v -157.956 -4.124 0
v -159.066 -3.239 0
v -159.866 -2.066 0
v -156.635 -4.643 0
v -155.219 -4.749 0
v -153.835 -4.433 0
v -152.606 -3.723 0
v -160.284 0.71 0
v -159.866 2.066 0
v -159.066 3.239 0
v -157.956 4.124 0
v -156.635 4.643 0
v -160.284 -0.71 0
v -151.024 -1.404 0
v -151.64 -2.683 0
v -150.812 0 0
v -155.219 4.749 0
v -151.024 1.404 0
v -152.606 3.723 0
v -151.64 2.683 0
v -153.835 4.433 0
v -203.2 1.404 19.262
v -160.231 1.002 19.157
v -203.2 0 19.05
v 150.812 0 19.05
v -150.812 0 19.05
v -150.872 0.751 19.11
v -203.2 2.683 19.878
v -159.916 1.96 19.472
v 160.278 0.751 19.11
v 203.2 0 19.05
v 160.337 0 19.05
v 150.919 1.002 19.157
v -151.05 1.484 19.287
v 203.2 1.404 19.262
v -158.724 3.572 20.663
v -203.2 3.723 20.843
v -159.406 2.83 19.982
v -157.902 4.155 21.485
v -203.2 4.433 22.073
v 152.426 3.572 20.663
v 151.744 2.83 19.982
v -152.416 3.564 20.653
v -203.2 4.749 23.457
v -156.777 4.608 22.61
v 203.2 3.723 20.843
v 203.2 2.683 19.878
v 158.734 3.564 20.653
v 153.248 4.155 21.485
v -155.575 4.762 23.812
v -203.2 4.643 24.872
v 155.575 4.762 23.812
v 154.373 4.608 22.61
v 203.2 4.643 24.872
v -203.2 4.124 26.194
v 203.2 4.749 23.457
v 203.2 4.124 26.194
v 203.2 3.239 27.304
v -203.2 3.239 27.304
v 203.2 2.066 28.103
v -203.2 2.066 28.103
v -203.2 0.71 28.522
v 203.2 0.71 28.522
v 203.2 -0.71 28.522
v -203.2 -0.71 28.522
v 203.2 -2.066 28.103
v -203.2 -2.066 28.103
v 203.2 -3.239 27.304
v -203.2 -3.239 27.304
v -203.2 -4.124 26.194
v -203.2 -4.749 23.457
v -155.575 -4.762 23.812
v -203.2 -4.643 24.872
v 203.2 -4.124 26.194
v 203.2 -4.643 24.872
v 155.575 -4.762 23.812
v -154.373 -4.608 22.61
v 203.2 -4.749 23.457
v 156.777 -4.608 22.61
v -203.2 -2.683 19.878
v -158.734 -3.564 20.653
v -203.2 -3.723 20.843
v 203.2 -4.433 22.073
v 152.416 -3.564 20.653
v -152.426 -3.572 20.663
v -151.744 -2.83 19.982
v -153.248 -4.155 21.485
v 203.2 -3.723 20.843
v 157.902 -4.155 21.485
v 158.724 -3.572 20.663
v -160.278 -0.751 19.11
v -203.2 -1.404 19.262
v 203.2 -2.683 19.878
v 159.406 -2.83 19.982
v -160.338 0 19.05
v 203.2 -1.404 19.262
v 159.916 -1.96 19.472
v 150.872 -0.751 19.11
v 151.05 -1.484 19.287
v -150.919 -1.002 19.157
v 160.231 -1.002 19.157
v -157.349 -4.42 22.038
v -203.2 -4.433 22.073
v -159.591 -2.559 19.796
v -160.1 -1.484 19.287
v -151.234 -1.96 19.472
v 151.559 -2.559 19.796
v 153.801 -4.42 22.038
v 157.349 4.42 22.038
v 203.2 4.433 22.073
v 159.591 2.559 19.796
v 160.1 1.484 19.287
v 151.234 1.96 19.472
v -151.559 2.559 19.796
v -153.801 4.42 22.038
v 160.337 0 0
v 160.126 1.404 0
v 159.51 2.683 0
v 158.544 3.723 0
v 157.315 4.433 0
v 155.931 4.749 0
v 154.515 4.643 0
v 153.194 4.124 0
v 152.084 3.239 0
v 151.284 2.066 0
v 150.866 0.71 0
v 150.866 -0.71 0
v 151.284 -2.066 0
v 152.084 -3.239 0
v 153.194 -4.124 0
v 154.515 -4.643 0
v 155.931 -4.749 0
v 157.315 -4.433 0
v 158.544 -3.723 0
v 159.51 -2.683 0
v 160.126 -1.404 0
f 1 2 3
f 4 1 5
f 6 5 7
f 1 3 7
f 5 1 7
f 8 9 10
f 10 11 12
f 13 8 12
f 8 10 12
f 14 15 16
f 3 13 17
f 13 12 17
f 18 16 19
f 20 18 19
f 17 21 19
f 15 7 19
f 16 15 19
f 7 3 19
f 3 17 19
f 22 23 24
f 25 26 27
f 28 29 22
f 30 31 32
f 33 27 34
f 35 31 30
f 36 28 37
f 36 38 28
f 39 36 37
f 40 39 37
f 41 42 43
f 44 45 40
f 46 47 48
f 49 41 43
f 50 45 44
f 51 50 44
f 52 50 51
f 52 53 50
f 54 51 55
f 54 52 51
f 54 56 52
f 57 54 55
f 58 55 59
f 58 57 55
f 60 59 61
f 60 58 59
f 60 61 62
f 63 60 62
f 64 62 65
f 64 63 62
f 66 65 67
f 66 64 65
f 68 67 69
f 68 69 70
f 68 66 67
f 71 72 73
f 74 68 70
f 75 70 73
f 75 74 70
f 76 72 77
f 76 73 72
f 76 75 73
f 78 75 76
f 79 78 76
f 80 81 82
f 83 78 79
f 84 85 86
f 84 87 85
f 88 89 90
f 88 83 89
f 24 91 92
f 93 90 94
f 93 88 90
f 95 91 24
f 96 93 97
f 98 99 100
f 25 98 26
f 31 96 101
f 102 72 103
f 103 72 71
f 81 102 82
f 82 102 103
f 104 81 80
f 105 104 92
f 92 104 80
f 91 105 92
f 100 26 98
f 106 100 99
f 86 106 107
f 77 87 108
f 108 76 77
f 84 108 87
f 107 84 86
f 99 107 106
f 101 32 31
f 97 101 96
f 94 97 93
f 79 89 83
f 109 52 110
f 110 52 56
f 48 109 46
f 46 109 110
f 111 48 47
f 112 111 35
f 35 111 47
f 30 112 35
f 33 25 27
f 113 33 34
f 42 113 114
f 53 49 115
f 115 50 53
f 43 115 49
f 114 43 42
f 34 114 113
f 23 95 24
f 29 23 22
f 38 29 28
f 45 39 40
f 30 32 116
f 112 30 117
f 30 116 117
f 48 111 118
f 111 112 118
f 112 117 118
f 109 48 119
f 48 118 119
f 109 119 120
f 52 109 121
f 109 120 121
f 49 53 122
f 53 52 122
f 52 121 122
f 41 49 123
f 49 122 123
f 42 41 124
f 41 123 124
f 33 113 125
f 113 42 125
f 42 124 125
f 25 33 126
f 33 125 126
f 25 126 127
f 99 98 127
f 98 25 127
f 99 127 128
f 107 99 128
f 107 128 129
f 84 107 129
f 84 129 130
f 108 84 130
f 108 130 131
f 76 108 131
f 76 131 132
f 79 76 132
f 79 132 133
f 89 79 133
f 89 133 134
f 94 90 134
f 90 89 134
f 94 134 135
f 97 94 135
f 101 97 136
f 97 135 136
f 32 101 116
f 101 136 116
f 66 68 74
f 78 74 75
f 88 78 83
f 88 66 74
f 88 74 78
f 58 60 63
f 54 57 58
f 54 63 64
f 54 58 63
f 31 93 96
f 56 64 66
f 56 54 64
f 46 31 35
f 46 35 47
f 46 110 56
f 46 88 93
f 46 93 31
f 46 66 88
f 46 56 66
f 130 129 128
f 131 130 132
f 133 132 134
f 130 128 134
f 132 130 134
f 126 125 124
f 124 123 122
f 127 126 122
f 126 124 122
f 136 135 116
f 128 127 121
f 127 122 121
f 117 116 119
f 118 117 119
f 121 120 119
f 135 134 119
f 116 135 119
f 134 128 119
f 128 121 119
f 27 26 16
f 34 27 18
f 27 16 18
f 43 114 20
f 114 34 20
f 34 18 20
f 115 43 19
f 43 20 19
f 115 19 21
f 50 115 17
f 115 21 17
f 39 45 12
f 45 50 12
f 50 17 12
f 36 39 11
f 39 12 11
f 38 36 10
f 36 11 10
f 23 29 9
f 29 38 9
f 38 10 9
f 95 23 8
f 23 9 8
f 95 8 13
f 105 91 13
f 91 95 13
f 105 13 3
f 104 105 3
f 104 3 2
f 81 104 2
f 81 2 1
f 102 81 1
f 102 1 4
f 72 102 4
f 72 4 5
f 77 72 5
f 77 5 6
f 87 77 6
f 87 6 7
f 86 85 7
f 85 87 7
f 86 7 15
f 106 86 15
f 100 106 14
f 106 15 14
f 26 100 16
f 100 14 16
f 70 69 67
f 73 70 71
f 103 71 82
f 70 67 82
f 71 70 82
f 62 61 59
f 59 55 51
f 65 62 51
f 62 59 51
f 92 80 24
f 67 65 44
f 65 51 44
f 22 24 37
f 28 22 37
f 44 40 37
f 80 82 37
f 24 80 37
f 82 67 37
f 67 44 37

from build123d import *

# Parameters (mm, degrees)
SKETCH2_R           = 4.7625
BOSS_EXTRUDE1_DEPTH = 203.2
BOSS_EXTRUDE2_REACH = 30.575
SKETCH1_R           = 4.7625


with BuildPart() as part:
    # Sketch2 → Boss-Extrude1 (new body, symmetric)
    with BuildSketch(Plane(origin=(0, 0, 0), x_dir=(0, 0, -1), z_dir=(1, 0, 0))):
        with Locations((-23.8125, 0)):
            Circle(SKETCH2_R)
    extrude(amount=BOSS_EXTRUDE1_DEPTH, both=True)

    # Sketch1 → Boss-Extrude2 (add, up to next)
    with BuildSketch(Plane.XY, mode=Mode.PRIVATE) as boss_extrude2_sk1:
        with Locations((-155.575, 0)):
            Circle(SKETCH1_R)
    boss_extrude2_tool1 = extrude(boss_extrude2_sk1.sketch, amount=BOSS_EXTRUDE2_REACH, mode=Mode.PRIVATE) - part.part
    add(boss_extrude2_tool1.solids().sort_by_distance((-155.575, 0, 0))[0])
    # Sketch1 → Boss-Extrude2 (add, up to next)
    with BuildSketch(Plane.XY, mode=Mode.PRIVATE) as boss_extrude2_sk2:
        with Locations((155.575, 0)):
            Circle(SKETCH1_R)
    boss_extrude2_tool2 = extrude(boss_extrude2_sk2.sketch, amount=BOSS_EXTRUDE2_REACH, mode=Mode.PRIVATE) - part.part
    add(boss_extrude2_tool2.solids().sort_by_distance((155.575, 0, 0))[0])


solid = part.part
